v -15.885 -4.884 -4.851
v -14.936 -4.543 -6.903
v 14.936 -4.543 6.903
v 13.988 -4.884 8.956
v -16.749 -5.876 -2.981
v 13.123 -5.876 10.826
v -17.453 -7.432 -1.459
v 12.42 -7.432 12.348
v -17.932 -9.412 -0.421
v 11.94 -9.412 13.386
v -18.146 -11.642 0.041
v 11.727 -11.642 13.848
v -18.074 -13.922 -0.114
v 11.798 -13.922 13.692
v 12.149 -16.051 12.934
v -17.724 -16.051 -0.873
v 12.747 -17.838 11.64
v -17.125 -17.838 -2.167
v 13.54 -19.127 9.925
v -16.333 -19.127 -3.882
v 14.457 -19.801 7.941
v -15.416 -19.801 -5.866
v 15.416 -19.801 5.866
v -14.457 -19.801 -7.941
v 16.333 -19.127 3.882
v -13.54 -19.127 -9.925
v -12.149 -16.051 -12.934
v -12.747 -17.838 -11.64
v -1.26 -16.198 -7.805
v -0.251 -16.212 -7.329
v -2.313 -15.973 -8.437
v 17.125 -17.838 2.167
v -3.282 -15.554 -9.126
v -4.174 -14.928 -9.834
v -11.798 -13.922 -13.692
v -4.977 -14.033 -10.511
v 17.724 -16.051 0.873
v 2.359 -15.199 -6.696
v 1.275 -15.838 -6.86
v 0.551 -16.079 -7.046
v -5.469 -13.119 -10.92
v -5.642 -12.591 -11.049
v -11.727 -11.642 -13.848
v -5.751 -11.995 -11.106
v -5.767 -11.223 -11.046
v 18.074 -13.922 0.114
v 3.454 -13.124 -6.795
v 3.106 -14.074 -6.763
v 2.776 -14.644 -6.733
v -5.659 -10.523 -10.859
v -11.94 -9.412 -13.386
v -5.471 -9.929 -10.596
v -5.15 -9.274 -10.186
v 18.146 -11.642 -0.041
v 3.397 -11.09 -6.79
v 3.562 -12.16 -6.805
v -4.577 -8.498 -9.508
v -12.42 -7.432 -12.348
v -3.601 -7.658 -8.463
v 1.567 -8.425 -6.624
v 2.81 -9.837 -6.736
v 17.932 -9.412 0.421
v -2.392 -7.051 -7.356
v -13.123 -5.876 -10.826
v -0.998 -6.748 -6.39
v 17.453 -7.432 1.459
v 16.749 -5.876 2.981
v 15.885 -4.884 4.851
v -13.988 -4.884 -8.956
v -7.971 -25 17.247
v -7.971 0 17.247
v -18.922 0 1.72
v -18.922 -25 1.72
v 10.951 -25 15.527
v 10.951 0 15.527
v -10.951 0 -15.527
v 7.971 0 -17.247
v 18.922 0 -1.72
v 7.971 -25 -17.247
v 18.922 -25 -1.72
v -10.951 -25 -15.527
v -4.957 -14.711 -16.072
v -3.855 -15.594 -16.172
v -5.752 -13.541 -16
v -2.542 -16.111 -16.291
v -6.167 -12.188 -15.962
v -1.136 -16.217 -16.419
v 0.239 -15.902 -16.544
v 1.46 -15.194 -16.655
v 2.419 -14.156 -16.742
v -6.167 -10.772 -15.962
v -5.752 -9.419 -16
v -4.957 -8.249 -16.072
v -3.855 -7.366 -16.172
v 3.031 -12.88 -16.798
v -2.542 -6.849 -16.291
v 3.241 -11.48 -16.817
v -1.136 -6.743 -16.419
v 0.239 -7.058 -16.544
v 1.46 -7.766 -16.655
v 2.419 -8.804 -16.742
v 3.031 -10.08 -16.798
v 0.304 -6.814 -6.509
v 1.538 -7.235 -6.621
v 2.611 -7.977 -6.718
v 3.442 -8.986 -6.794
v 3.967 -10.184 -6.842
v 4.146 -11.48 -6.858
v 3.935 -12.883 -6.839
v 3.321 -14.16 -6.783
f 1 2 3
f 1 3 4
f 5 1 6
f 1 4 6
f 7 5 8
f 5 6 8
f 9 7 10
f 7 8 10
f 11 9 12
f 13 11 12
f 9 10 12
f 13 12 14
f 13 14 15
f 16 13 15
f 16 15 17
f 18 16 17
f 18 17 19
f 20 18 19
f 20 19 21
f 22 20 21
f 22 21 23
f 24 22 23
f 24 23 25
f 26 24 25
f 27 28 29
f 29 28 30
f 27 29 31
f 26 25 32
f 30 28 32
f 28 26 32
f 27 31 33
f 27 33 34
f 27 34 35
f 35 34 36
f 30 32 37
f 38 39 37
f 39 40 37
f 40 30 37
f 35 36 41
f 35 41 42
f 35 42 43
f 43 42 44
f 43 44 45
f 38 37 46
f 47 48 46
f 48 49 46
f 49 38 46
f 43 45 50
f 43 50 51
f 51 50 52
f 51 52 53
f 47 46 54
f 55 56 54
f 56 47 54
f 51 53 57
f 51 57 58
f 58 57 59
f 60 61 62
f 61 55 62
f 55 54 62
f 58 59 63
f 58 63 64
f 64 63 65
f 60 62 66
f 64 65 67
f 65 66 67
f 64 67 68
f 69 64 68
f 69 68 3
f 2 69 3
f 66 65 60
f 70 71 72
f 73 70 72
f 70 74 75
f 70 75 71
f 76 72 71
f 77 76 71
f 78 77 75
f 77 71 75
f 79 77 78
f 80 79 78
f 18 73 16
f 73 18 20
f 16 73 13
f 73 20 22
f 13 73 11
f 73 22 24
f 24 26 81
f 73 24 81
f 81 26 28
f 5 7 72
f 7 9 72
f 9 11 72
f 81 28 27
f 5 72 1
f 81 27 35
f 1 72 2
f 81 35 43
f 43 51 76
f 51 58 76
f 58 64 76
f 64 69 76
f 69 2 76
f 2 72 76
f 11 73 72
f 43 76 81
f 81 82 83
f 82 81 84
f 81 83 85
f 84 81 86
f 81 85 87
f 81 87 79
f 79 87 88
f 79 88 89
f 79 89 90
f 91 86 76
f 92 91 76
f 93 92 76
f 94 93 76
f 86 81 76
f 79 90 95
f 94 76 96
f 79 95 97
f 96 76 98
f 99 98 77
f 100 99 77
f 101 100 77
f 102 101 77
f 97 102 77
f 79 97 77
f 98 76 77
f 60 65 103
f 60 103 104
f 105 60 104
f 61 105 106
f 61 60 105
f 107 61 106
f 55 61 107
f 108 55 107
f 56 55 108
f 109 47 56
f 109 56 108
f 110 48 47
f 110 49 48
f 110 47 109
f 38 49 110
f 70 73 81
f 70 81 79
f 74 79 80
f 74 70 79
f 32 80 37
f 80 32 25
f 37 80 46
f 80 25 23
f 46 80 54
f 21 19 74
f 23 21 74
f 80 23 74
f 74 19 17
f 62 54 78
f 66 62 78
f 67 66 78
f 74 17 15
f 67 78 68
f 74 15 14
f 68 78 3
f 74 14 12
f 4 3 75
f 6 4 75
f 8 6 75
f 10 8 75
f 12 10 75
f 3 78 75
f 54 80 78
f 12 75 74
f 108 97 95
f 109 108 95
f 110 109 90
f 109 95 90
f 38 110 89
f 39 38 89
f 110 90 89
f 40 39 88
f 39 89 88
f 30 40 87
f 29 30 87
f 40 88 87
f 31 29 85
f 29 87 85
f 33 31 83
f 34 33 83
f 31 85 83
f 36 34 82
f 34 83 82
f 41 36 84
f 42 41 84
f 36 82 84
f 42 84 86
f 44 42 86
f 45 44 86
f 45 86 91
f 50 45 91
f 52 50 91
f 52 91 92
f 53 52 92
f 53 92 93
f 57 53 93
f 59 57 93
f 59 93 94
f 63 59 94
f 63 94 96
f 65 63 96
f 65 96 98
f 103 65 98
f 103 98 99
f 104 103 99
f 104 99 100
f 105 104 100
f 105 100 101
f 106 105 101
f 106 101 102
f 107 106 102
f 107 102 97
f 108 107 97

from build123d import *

# Parameters (mm, degrees)
F1_DEPTH = 25
F2_R     = 4.75
F3_DEPTH = 10
F4_R     = 7.6714476374
F5_DEPTH = 39.4


with BuildPart() as f1:
    # F0 (on Front) → F1 (new body)
    with BuildSketch(Plane.XZ):
        Polygon((-7.9714226845, 17.2469249544), (-18.92198649, 1.7200079281), (-10.9505638054, -15.5269170263), (7.9714226845, -17.2469249544), (18.92198649, -1.7200079281), (10.9505638054, 15.5269170263), align=None)
    extrude(amount=F1_DEPTH)

    # F2 (on face) → F3 (cut)
    with BuildSketch(Plane(origin=(-1.4895705605, 0, -16.3869209904), x_dir=(0.9958940258, 0, -0.0905267331), z_dir=(-0.0905267331, 0, -0.9958940258))):
        with Locations((0, 11.4799719304)):
            Circle(F2_R)
    extrude(amount=-F3_DEPTH, mode=Mode.SUBTRACT)

    # F4 (on face) → F5 (cut)
    with BuildSketch(Plane(origin=(14.9362751477, 0, 6.9034545491), x_dir=(0, 1, 0), z_dir=(0.9077328923, 0, 0.4195485623))):
        with Locations((-12.2148720548, 0)):
            Circle(F4_R)
    extrude(amount=-F5_DEPTH, mode=Mode.SUBTRACT)


solid = f1.part
